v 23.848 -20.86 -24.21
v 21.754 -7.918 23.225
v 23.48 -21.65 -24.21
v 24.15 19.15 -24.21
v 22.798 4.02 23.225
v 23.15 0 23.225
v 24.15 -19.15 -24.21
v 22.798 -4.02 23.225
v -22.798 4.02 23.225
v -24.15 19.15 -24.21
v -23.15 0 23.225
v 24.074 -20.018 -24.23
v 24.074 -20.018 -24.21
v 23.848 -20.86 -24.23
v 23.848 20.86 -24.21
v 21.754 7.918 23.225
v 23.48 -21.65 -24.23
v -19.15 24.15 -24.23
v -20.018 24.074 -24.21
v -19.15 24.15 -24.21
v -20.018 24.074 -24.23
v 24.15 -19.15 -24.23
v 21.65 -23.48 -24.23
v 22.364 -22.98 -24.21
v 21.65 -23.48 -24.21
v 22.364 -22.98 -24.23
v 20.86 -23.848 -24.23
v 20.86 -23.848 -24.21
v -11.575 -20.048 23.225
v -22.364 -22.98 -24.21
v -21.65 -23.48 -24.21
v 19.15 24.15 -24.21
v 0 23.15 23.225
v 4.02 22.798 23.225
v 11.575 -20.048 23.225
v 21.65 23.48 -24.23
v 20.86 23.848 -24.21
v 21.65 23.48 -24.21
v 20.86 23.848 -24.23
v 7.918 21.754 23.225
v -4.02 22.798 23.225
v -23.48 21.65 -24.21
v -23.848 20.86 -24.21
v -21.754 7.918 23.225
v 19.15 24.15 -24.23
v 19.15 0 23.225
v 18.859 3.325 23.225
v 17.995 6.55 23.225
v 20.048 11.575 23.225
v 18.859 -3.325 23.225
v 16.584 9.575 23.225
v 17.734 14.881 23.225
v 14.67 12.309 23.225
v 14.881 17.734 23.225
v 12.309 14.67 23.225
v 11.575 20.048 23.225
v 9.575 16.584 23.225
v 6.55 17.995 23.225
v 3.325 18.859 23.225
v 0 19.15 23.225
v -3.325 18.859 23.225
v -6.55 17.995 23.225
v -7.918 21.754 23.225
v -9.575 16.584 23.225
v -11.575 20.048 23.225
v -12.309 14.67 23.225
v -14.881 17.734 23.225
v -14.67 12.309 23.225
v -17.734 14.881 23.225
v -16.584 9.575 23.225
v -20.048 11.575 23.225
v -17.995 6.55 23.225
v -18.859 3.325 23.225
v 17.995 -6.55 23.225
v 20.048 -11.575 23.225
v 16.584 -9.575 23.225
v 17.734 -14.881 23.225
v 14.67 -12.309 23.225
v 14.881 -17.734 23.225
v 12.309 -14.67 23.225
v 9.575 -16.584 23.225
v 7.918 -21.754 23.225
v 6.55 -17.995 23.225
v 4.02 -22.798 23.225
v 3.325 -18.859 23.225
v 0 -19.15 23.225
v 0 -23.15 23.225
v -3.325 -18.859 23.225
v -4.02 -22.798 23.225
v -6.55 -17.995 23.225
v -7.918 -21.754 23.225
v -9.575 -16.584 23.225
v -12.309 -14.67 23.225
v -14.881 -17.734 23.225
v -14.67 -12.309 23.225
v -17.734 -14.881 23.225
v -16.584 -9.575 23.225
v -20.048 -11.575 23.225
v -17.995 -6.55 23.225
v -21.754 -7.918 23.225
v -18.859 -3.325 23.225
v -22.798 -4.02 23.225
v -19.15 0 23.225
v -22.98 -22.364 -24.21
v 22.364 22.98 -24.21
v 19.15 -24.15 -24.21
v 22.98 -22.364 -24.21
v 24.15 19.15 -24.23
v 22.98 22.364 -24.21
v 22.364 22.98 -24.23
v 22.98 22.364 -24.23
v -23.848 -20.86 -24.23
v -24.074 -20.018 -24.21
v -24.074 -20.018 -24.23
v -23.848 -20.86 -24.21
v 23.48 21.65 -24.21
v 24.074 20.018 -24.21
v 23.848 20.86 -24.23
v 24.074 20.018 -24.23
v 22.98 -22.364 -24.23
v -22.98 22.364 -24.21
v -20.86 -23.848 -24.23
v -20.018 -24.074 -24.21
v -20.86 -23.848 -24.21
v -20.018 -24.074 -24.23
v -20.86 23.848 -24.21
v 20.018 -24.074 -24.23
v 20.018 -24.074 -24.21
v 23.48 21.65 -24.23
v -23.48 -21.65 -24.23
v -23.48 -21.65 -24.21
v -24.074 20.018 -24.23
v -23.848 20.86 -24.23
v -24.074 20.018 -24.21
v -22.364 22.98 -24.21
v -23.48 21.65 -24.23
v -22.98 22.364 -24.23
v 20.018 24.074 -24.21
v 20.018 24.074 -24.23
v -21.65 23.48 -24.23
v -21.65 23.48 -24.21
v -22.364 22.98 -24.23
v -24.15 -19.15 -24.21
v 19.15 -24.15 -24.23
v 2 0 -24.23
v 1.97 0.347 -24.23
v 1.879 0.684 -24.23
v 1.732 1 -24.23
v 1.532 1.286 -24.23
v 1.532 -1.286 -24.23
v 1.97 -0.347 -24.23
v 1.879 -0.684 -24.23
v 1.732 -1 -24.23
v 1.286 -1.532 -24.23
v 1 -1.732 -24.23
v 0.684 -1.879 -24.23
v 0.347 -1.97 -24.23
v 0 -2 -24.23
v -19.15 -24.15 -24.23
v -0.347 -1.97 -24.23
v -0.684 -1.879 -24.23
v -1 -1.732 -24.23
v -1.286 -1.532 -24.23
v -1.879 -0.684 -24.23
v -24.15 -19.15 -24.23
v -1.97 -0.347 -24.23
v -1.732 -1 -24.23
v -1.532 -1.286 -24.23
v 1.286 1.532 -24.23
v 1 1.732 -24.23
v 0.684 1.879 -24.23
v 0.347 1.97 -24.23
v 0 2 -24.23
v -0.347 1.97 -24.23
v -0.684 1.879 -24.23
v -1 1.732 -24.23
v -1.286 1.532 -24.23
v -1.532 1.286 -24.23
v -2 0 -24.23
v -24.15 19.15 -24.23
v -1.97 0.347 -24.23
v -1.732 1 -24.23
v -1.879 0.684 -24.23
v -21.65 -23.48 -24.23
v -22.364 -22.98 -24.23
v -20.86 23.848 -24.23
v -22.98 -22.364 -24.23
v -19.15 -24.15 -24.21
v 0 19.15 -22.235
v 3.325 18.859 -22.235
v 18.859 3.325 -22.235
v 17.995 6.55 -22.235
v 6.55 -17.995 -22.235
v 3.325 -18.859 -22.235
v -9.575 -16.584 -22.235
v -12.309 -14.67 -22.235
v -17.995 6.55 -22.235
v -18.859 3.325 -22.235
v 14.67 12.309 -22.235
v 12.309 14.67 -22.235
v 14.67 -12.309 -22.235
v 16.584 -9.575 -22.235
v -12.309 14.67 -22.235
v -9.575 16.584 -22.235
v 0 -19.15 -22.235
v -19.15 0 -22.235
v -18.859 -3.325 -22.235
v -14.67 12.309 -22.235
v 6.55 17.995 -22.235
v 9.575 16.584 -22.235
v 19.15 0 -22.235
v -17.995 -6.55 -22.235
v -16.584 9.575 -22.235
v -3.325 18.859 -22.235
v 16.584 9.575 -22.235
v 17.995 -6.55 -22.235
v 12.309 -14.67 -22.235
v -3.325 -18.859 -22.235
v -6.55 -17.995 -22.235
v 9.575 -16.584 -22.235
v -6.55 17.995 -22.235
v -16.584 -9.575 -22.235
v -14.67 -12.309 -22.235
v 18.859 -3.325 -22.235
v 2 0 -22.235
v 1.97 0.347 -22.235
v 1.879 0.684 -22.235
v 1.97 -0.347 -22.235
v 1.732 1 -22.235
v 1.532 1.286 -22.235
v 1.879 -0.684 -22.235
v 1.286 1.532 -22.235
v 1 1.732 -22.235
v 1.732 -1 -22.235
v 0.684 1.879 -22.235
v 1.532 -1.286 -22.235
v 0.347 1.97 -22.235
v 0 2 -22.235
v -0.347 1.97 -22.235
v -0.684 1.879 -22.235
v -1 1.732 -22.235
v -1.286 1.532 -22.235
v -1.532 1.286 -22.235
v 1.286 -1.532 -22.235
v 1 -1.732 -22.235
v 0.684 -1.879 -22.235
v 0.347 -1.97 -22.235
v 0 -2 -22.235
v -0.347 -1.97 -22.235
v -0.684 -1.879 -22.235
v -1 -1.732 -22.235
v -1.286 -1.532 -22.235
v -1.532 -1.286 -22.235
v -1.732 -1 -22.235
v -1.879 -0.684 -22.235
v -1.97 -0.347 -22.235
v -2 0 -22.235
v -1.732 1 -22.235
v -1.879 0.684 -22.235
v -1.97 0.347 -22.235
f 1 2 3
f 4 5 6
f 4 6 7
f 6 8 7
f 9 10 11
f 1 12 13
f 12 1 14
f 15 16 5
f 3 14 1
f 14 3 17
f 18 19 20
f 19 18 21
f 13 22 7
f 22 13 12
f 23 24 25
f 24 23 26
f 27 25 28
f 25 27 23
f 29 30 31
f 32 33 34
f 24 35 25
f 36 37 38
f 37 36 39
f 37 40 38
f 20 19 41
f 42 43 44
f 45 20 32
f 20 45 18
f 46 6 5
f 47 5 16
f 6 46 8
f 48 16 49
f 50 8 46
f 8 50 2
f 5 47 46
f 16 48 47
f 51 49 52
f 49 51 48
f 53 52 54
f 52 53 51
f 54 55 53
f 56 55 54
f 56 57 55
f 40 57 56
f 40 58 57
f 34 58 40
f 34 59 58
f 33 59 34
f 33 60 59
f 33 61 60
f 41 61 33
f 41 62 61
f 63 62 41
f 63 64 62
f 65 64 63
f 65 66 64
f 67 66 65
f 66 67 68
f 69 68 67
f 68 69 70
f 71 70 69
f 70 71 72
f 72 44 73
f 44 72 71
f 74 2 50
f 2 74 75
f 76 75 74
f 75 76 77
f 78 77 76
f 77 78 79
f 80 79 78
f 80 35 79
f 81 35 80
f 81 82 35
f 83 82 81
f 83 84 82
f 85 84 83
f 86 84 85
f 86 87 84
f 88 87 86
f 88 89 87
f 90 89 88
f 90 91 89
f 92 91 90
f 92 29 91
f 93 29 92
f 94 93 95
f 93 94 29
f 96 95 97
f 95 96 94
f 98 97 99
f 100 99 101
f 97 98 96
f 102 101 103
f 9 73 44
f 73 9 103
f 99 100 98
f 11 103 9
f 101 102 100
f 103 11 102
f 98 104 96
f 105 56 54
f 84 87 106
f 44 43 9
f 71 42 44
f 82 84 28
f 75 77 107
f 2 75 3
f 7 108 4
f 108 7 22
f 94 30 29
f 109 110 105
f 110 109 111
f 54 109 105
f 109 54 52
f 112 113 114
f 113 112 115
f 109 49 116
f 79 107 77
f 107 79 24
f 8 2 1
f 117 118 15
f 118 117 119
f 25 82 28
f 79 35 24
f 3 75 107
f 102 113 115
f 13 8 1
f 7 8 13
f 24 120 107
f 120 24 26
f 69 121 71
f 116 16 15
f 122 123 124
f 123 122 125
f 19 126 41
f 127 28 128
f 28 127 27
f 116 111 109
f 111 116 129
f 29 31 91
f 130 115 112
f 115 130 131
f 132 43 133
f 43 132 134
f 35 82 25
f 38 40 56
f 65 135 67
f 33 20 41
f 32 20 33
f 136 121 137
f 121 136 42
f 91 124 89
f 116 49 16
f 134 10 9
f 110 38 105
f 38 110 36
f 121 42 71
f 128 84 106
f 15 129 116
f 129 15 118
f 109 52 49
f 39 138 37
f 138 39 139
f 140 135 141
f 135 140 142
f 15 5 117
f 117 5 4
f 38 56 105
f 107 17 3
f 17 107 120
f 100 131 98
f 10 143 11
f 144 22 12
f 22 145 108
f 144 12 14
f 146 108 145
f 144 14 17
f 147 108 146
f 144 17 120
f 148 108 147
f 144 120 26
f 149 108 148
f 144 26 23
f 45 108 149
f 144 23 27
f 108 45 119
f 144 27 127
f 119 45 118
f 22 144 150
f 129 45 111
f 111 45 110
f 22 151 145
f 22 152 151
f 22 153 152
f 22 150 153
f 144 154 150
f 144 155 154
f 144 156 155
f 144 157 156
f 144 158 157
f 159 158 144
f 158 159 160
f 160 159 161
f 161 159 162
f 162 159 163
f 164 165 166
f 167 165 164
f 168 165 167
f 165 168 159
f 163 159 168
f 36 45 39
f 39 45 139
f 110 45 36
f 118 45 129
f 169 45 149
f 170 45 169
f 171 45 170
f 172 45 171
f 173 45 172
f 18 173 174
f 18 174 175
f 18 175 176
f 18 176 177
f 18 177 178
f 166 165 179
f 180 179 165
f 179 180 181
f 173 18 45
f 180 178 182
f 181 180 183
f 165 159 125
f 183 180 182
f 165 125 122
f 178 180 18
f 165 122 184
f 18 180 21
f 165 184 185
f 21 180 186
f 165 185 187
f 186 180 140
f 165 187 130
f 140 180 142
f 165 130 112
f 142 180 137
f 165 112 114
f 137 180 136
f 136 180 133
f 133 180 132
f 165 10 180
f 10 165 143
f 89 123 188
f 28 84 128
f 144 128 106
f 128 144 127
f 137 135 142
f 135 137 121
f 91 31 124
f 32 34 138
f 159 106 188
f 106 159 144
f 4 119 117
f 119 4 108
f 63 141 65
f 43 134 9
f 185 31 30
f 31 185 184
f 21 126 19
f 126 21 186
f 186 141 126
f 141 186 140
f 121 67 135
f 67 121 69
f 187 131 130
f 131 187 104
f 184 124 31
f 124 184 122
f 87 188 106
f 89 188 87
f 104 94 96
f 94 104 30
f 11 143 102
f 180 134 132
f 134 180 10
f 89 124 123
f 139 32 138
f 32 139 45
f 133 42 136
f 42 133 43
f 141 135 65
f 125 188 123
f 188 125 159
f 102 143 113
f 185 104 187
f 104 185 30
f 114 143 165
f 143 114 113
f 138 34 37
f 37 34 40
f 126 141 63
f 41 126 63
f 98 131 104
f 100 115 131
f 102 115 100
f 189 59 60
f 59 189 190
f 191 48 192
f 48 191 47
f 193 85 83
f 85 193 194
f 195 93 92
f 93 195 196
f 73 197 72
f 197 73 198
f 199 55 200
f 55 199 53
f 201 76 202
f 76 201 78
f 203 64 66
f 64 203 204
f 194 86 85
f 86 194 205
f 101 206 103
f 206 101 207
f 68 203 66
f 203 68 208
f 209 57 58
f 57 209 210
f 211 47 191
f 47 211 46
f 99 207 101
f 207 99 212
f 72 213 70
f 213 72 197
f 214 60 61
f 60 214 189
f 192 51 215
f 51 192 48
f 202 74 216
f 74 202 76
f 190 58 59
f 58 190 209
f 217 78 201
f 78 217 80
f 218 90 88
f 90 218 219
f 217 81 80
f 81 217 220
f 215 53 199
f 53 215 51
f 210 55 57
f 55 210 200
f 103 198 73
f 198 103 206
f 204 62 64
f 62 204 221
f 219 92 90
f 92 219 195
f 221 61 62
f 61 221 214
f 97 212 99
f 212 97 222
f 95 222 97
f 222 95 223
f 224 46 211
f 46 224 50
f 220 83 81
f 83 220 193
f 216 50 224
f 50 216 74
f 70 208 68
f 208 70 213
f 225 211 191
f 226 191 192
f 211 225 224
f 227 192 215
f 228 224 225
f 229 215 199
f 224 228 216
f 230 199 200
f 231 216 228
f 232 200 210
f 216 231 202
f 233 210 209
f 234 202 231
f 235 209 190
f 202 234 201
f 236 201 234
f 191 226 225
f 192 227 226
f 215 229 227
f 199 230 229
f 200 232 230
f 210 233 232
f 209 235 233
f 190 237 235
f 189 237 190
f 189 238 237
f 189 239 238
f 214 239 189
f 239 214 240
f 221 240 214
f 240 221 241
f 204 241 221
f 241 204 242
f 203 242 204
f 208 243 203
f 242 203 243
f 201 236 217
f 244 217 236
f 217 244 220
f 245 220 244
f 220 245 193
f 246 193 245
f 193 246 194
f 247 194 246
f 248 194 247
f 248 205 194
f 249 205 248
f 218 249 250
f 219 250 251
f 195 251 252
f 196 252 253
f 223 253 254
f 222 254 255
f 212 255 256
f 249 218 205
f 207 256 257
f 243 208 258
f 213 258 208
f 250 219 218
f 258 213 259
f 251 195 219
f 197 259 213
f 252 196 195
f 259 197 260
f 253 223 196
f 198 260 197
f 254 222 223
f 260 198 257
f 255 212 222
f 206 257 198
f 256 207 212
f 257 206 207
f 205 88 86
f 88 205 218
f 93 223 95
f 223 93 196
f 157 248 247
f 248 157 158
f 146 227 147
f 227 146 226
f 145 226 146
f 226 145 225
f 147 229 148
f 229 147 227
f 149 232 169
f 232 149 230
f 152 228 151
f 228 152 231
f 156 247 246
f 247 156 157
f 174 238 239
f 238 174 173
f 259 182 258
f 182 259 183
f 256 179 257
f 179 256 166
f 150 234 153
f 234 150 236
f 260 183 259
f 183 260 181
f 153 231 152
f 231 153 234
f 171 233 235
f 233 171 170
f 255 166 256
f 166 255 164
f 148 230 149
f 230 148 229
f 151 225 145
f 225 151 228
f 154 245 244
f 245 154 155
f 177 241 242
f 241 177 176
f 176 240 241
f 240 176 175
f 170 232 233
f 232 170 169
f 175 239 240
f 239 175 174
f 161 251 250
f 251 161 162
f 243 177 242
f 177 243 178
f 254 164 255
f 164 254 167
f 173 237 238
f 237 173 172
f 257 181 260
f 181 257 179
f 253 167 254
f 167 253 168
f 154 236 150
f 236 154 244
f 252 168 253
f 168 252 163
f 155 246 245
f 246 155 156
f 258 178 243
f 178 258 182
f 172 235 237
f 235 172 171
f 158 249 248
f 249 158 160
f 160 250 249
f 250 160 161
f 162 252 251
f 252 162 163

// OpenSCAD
inner_width = 1.5 * 25.4; //mm
height = 1.75 * 25.4; //mm
top_wall_thickness = 4; //mm
bottom_wall_thickness = 5; //mm
floor_thickness = 2;//mm
tolerance = 0.2; //mm
hole_width=4;//mm
$fn=36;

difference() {
  hull() {
    translate([0,0,height / -2 - floor_thickness])
      minkowski() {
        cube([
          inner_width + tolerance,
          inner_width + tolerance,
          0.01],
         center = true);
        cylinder(d = 2 * bottom_wall_thickness, h=0.01);
    }
    cylinder(
      d = top_wall_thickness * 2 + inner_width + tolerance,
      h = height + floor_thickness,
      center = true
    );
  }

  // dowel hole
  translate([0, 0, floor_thickness]) {
    cylinder(
      d = inner_width + tolerance,
      h = height + 2 * floor_thickness + 0.02,
      center = true
    );
  }
  // screw hole
  cylinder(
           d = hole_width,
           h = height + floor_thickness * 3,
           center = true
           );
}
